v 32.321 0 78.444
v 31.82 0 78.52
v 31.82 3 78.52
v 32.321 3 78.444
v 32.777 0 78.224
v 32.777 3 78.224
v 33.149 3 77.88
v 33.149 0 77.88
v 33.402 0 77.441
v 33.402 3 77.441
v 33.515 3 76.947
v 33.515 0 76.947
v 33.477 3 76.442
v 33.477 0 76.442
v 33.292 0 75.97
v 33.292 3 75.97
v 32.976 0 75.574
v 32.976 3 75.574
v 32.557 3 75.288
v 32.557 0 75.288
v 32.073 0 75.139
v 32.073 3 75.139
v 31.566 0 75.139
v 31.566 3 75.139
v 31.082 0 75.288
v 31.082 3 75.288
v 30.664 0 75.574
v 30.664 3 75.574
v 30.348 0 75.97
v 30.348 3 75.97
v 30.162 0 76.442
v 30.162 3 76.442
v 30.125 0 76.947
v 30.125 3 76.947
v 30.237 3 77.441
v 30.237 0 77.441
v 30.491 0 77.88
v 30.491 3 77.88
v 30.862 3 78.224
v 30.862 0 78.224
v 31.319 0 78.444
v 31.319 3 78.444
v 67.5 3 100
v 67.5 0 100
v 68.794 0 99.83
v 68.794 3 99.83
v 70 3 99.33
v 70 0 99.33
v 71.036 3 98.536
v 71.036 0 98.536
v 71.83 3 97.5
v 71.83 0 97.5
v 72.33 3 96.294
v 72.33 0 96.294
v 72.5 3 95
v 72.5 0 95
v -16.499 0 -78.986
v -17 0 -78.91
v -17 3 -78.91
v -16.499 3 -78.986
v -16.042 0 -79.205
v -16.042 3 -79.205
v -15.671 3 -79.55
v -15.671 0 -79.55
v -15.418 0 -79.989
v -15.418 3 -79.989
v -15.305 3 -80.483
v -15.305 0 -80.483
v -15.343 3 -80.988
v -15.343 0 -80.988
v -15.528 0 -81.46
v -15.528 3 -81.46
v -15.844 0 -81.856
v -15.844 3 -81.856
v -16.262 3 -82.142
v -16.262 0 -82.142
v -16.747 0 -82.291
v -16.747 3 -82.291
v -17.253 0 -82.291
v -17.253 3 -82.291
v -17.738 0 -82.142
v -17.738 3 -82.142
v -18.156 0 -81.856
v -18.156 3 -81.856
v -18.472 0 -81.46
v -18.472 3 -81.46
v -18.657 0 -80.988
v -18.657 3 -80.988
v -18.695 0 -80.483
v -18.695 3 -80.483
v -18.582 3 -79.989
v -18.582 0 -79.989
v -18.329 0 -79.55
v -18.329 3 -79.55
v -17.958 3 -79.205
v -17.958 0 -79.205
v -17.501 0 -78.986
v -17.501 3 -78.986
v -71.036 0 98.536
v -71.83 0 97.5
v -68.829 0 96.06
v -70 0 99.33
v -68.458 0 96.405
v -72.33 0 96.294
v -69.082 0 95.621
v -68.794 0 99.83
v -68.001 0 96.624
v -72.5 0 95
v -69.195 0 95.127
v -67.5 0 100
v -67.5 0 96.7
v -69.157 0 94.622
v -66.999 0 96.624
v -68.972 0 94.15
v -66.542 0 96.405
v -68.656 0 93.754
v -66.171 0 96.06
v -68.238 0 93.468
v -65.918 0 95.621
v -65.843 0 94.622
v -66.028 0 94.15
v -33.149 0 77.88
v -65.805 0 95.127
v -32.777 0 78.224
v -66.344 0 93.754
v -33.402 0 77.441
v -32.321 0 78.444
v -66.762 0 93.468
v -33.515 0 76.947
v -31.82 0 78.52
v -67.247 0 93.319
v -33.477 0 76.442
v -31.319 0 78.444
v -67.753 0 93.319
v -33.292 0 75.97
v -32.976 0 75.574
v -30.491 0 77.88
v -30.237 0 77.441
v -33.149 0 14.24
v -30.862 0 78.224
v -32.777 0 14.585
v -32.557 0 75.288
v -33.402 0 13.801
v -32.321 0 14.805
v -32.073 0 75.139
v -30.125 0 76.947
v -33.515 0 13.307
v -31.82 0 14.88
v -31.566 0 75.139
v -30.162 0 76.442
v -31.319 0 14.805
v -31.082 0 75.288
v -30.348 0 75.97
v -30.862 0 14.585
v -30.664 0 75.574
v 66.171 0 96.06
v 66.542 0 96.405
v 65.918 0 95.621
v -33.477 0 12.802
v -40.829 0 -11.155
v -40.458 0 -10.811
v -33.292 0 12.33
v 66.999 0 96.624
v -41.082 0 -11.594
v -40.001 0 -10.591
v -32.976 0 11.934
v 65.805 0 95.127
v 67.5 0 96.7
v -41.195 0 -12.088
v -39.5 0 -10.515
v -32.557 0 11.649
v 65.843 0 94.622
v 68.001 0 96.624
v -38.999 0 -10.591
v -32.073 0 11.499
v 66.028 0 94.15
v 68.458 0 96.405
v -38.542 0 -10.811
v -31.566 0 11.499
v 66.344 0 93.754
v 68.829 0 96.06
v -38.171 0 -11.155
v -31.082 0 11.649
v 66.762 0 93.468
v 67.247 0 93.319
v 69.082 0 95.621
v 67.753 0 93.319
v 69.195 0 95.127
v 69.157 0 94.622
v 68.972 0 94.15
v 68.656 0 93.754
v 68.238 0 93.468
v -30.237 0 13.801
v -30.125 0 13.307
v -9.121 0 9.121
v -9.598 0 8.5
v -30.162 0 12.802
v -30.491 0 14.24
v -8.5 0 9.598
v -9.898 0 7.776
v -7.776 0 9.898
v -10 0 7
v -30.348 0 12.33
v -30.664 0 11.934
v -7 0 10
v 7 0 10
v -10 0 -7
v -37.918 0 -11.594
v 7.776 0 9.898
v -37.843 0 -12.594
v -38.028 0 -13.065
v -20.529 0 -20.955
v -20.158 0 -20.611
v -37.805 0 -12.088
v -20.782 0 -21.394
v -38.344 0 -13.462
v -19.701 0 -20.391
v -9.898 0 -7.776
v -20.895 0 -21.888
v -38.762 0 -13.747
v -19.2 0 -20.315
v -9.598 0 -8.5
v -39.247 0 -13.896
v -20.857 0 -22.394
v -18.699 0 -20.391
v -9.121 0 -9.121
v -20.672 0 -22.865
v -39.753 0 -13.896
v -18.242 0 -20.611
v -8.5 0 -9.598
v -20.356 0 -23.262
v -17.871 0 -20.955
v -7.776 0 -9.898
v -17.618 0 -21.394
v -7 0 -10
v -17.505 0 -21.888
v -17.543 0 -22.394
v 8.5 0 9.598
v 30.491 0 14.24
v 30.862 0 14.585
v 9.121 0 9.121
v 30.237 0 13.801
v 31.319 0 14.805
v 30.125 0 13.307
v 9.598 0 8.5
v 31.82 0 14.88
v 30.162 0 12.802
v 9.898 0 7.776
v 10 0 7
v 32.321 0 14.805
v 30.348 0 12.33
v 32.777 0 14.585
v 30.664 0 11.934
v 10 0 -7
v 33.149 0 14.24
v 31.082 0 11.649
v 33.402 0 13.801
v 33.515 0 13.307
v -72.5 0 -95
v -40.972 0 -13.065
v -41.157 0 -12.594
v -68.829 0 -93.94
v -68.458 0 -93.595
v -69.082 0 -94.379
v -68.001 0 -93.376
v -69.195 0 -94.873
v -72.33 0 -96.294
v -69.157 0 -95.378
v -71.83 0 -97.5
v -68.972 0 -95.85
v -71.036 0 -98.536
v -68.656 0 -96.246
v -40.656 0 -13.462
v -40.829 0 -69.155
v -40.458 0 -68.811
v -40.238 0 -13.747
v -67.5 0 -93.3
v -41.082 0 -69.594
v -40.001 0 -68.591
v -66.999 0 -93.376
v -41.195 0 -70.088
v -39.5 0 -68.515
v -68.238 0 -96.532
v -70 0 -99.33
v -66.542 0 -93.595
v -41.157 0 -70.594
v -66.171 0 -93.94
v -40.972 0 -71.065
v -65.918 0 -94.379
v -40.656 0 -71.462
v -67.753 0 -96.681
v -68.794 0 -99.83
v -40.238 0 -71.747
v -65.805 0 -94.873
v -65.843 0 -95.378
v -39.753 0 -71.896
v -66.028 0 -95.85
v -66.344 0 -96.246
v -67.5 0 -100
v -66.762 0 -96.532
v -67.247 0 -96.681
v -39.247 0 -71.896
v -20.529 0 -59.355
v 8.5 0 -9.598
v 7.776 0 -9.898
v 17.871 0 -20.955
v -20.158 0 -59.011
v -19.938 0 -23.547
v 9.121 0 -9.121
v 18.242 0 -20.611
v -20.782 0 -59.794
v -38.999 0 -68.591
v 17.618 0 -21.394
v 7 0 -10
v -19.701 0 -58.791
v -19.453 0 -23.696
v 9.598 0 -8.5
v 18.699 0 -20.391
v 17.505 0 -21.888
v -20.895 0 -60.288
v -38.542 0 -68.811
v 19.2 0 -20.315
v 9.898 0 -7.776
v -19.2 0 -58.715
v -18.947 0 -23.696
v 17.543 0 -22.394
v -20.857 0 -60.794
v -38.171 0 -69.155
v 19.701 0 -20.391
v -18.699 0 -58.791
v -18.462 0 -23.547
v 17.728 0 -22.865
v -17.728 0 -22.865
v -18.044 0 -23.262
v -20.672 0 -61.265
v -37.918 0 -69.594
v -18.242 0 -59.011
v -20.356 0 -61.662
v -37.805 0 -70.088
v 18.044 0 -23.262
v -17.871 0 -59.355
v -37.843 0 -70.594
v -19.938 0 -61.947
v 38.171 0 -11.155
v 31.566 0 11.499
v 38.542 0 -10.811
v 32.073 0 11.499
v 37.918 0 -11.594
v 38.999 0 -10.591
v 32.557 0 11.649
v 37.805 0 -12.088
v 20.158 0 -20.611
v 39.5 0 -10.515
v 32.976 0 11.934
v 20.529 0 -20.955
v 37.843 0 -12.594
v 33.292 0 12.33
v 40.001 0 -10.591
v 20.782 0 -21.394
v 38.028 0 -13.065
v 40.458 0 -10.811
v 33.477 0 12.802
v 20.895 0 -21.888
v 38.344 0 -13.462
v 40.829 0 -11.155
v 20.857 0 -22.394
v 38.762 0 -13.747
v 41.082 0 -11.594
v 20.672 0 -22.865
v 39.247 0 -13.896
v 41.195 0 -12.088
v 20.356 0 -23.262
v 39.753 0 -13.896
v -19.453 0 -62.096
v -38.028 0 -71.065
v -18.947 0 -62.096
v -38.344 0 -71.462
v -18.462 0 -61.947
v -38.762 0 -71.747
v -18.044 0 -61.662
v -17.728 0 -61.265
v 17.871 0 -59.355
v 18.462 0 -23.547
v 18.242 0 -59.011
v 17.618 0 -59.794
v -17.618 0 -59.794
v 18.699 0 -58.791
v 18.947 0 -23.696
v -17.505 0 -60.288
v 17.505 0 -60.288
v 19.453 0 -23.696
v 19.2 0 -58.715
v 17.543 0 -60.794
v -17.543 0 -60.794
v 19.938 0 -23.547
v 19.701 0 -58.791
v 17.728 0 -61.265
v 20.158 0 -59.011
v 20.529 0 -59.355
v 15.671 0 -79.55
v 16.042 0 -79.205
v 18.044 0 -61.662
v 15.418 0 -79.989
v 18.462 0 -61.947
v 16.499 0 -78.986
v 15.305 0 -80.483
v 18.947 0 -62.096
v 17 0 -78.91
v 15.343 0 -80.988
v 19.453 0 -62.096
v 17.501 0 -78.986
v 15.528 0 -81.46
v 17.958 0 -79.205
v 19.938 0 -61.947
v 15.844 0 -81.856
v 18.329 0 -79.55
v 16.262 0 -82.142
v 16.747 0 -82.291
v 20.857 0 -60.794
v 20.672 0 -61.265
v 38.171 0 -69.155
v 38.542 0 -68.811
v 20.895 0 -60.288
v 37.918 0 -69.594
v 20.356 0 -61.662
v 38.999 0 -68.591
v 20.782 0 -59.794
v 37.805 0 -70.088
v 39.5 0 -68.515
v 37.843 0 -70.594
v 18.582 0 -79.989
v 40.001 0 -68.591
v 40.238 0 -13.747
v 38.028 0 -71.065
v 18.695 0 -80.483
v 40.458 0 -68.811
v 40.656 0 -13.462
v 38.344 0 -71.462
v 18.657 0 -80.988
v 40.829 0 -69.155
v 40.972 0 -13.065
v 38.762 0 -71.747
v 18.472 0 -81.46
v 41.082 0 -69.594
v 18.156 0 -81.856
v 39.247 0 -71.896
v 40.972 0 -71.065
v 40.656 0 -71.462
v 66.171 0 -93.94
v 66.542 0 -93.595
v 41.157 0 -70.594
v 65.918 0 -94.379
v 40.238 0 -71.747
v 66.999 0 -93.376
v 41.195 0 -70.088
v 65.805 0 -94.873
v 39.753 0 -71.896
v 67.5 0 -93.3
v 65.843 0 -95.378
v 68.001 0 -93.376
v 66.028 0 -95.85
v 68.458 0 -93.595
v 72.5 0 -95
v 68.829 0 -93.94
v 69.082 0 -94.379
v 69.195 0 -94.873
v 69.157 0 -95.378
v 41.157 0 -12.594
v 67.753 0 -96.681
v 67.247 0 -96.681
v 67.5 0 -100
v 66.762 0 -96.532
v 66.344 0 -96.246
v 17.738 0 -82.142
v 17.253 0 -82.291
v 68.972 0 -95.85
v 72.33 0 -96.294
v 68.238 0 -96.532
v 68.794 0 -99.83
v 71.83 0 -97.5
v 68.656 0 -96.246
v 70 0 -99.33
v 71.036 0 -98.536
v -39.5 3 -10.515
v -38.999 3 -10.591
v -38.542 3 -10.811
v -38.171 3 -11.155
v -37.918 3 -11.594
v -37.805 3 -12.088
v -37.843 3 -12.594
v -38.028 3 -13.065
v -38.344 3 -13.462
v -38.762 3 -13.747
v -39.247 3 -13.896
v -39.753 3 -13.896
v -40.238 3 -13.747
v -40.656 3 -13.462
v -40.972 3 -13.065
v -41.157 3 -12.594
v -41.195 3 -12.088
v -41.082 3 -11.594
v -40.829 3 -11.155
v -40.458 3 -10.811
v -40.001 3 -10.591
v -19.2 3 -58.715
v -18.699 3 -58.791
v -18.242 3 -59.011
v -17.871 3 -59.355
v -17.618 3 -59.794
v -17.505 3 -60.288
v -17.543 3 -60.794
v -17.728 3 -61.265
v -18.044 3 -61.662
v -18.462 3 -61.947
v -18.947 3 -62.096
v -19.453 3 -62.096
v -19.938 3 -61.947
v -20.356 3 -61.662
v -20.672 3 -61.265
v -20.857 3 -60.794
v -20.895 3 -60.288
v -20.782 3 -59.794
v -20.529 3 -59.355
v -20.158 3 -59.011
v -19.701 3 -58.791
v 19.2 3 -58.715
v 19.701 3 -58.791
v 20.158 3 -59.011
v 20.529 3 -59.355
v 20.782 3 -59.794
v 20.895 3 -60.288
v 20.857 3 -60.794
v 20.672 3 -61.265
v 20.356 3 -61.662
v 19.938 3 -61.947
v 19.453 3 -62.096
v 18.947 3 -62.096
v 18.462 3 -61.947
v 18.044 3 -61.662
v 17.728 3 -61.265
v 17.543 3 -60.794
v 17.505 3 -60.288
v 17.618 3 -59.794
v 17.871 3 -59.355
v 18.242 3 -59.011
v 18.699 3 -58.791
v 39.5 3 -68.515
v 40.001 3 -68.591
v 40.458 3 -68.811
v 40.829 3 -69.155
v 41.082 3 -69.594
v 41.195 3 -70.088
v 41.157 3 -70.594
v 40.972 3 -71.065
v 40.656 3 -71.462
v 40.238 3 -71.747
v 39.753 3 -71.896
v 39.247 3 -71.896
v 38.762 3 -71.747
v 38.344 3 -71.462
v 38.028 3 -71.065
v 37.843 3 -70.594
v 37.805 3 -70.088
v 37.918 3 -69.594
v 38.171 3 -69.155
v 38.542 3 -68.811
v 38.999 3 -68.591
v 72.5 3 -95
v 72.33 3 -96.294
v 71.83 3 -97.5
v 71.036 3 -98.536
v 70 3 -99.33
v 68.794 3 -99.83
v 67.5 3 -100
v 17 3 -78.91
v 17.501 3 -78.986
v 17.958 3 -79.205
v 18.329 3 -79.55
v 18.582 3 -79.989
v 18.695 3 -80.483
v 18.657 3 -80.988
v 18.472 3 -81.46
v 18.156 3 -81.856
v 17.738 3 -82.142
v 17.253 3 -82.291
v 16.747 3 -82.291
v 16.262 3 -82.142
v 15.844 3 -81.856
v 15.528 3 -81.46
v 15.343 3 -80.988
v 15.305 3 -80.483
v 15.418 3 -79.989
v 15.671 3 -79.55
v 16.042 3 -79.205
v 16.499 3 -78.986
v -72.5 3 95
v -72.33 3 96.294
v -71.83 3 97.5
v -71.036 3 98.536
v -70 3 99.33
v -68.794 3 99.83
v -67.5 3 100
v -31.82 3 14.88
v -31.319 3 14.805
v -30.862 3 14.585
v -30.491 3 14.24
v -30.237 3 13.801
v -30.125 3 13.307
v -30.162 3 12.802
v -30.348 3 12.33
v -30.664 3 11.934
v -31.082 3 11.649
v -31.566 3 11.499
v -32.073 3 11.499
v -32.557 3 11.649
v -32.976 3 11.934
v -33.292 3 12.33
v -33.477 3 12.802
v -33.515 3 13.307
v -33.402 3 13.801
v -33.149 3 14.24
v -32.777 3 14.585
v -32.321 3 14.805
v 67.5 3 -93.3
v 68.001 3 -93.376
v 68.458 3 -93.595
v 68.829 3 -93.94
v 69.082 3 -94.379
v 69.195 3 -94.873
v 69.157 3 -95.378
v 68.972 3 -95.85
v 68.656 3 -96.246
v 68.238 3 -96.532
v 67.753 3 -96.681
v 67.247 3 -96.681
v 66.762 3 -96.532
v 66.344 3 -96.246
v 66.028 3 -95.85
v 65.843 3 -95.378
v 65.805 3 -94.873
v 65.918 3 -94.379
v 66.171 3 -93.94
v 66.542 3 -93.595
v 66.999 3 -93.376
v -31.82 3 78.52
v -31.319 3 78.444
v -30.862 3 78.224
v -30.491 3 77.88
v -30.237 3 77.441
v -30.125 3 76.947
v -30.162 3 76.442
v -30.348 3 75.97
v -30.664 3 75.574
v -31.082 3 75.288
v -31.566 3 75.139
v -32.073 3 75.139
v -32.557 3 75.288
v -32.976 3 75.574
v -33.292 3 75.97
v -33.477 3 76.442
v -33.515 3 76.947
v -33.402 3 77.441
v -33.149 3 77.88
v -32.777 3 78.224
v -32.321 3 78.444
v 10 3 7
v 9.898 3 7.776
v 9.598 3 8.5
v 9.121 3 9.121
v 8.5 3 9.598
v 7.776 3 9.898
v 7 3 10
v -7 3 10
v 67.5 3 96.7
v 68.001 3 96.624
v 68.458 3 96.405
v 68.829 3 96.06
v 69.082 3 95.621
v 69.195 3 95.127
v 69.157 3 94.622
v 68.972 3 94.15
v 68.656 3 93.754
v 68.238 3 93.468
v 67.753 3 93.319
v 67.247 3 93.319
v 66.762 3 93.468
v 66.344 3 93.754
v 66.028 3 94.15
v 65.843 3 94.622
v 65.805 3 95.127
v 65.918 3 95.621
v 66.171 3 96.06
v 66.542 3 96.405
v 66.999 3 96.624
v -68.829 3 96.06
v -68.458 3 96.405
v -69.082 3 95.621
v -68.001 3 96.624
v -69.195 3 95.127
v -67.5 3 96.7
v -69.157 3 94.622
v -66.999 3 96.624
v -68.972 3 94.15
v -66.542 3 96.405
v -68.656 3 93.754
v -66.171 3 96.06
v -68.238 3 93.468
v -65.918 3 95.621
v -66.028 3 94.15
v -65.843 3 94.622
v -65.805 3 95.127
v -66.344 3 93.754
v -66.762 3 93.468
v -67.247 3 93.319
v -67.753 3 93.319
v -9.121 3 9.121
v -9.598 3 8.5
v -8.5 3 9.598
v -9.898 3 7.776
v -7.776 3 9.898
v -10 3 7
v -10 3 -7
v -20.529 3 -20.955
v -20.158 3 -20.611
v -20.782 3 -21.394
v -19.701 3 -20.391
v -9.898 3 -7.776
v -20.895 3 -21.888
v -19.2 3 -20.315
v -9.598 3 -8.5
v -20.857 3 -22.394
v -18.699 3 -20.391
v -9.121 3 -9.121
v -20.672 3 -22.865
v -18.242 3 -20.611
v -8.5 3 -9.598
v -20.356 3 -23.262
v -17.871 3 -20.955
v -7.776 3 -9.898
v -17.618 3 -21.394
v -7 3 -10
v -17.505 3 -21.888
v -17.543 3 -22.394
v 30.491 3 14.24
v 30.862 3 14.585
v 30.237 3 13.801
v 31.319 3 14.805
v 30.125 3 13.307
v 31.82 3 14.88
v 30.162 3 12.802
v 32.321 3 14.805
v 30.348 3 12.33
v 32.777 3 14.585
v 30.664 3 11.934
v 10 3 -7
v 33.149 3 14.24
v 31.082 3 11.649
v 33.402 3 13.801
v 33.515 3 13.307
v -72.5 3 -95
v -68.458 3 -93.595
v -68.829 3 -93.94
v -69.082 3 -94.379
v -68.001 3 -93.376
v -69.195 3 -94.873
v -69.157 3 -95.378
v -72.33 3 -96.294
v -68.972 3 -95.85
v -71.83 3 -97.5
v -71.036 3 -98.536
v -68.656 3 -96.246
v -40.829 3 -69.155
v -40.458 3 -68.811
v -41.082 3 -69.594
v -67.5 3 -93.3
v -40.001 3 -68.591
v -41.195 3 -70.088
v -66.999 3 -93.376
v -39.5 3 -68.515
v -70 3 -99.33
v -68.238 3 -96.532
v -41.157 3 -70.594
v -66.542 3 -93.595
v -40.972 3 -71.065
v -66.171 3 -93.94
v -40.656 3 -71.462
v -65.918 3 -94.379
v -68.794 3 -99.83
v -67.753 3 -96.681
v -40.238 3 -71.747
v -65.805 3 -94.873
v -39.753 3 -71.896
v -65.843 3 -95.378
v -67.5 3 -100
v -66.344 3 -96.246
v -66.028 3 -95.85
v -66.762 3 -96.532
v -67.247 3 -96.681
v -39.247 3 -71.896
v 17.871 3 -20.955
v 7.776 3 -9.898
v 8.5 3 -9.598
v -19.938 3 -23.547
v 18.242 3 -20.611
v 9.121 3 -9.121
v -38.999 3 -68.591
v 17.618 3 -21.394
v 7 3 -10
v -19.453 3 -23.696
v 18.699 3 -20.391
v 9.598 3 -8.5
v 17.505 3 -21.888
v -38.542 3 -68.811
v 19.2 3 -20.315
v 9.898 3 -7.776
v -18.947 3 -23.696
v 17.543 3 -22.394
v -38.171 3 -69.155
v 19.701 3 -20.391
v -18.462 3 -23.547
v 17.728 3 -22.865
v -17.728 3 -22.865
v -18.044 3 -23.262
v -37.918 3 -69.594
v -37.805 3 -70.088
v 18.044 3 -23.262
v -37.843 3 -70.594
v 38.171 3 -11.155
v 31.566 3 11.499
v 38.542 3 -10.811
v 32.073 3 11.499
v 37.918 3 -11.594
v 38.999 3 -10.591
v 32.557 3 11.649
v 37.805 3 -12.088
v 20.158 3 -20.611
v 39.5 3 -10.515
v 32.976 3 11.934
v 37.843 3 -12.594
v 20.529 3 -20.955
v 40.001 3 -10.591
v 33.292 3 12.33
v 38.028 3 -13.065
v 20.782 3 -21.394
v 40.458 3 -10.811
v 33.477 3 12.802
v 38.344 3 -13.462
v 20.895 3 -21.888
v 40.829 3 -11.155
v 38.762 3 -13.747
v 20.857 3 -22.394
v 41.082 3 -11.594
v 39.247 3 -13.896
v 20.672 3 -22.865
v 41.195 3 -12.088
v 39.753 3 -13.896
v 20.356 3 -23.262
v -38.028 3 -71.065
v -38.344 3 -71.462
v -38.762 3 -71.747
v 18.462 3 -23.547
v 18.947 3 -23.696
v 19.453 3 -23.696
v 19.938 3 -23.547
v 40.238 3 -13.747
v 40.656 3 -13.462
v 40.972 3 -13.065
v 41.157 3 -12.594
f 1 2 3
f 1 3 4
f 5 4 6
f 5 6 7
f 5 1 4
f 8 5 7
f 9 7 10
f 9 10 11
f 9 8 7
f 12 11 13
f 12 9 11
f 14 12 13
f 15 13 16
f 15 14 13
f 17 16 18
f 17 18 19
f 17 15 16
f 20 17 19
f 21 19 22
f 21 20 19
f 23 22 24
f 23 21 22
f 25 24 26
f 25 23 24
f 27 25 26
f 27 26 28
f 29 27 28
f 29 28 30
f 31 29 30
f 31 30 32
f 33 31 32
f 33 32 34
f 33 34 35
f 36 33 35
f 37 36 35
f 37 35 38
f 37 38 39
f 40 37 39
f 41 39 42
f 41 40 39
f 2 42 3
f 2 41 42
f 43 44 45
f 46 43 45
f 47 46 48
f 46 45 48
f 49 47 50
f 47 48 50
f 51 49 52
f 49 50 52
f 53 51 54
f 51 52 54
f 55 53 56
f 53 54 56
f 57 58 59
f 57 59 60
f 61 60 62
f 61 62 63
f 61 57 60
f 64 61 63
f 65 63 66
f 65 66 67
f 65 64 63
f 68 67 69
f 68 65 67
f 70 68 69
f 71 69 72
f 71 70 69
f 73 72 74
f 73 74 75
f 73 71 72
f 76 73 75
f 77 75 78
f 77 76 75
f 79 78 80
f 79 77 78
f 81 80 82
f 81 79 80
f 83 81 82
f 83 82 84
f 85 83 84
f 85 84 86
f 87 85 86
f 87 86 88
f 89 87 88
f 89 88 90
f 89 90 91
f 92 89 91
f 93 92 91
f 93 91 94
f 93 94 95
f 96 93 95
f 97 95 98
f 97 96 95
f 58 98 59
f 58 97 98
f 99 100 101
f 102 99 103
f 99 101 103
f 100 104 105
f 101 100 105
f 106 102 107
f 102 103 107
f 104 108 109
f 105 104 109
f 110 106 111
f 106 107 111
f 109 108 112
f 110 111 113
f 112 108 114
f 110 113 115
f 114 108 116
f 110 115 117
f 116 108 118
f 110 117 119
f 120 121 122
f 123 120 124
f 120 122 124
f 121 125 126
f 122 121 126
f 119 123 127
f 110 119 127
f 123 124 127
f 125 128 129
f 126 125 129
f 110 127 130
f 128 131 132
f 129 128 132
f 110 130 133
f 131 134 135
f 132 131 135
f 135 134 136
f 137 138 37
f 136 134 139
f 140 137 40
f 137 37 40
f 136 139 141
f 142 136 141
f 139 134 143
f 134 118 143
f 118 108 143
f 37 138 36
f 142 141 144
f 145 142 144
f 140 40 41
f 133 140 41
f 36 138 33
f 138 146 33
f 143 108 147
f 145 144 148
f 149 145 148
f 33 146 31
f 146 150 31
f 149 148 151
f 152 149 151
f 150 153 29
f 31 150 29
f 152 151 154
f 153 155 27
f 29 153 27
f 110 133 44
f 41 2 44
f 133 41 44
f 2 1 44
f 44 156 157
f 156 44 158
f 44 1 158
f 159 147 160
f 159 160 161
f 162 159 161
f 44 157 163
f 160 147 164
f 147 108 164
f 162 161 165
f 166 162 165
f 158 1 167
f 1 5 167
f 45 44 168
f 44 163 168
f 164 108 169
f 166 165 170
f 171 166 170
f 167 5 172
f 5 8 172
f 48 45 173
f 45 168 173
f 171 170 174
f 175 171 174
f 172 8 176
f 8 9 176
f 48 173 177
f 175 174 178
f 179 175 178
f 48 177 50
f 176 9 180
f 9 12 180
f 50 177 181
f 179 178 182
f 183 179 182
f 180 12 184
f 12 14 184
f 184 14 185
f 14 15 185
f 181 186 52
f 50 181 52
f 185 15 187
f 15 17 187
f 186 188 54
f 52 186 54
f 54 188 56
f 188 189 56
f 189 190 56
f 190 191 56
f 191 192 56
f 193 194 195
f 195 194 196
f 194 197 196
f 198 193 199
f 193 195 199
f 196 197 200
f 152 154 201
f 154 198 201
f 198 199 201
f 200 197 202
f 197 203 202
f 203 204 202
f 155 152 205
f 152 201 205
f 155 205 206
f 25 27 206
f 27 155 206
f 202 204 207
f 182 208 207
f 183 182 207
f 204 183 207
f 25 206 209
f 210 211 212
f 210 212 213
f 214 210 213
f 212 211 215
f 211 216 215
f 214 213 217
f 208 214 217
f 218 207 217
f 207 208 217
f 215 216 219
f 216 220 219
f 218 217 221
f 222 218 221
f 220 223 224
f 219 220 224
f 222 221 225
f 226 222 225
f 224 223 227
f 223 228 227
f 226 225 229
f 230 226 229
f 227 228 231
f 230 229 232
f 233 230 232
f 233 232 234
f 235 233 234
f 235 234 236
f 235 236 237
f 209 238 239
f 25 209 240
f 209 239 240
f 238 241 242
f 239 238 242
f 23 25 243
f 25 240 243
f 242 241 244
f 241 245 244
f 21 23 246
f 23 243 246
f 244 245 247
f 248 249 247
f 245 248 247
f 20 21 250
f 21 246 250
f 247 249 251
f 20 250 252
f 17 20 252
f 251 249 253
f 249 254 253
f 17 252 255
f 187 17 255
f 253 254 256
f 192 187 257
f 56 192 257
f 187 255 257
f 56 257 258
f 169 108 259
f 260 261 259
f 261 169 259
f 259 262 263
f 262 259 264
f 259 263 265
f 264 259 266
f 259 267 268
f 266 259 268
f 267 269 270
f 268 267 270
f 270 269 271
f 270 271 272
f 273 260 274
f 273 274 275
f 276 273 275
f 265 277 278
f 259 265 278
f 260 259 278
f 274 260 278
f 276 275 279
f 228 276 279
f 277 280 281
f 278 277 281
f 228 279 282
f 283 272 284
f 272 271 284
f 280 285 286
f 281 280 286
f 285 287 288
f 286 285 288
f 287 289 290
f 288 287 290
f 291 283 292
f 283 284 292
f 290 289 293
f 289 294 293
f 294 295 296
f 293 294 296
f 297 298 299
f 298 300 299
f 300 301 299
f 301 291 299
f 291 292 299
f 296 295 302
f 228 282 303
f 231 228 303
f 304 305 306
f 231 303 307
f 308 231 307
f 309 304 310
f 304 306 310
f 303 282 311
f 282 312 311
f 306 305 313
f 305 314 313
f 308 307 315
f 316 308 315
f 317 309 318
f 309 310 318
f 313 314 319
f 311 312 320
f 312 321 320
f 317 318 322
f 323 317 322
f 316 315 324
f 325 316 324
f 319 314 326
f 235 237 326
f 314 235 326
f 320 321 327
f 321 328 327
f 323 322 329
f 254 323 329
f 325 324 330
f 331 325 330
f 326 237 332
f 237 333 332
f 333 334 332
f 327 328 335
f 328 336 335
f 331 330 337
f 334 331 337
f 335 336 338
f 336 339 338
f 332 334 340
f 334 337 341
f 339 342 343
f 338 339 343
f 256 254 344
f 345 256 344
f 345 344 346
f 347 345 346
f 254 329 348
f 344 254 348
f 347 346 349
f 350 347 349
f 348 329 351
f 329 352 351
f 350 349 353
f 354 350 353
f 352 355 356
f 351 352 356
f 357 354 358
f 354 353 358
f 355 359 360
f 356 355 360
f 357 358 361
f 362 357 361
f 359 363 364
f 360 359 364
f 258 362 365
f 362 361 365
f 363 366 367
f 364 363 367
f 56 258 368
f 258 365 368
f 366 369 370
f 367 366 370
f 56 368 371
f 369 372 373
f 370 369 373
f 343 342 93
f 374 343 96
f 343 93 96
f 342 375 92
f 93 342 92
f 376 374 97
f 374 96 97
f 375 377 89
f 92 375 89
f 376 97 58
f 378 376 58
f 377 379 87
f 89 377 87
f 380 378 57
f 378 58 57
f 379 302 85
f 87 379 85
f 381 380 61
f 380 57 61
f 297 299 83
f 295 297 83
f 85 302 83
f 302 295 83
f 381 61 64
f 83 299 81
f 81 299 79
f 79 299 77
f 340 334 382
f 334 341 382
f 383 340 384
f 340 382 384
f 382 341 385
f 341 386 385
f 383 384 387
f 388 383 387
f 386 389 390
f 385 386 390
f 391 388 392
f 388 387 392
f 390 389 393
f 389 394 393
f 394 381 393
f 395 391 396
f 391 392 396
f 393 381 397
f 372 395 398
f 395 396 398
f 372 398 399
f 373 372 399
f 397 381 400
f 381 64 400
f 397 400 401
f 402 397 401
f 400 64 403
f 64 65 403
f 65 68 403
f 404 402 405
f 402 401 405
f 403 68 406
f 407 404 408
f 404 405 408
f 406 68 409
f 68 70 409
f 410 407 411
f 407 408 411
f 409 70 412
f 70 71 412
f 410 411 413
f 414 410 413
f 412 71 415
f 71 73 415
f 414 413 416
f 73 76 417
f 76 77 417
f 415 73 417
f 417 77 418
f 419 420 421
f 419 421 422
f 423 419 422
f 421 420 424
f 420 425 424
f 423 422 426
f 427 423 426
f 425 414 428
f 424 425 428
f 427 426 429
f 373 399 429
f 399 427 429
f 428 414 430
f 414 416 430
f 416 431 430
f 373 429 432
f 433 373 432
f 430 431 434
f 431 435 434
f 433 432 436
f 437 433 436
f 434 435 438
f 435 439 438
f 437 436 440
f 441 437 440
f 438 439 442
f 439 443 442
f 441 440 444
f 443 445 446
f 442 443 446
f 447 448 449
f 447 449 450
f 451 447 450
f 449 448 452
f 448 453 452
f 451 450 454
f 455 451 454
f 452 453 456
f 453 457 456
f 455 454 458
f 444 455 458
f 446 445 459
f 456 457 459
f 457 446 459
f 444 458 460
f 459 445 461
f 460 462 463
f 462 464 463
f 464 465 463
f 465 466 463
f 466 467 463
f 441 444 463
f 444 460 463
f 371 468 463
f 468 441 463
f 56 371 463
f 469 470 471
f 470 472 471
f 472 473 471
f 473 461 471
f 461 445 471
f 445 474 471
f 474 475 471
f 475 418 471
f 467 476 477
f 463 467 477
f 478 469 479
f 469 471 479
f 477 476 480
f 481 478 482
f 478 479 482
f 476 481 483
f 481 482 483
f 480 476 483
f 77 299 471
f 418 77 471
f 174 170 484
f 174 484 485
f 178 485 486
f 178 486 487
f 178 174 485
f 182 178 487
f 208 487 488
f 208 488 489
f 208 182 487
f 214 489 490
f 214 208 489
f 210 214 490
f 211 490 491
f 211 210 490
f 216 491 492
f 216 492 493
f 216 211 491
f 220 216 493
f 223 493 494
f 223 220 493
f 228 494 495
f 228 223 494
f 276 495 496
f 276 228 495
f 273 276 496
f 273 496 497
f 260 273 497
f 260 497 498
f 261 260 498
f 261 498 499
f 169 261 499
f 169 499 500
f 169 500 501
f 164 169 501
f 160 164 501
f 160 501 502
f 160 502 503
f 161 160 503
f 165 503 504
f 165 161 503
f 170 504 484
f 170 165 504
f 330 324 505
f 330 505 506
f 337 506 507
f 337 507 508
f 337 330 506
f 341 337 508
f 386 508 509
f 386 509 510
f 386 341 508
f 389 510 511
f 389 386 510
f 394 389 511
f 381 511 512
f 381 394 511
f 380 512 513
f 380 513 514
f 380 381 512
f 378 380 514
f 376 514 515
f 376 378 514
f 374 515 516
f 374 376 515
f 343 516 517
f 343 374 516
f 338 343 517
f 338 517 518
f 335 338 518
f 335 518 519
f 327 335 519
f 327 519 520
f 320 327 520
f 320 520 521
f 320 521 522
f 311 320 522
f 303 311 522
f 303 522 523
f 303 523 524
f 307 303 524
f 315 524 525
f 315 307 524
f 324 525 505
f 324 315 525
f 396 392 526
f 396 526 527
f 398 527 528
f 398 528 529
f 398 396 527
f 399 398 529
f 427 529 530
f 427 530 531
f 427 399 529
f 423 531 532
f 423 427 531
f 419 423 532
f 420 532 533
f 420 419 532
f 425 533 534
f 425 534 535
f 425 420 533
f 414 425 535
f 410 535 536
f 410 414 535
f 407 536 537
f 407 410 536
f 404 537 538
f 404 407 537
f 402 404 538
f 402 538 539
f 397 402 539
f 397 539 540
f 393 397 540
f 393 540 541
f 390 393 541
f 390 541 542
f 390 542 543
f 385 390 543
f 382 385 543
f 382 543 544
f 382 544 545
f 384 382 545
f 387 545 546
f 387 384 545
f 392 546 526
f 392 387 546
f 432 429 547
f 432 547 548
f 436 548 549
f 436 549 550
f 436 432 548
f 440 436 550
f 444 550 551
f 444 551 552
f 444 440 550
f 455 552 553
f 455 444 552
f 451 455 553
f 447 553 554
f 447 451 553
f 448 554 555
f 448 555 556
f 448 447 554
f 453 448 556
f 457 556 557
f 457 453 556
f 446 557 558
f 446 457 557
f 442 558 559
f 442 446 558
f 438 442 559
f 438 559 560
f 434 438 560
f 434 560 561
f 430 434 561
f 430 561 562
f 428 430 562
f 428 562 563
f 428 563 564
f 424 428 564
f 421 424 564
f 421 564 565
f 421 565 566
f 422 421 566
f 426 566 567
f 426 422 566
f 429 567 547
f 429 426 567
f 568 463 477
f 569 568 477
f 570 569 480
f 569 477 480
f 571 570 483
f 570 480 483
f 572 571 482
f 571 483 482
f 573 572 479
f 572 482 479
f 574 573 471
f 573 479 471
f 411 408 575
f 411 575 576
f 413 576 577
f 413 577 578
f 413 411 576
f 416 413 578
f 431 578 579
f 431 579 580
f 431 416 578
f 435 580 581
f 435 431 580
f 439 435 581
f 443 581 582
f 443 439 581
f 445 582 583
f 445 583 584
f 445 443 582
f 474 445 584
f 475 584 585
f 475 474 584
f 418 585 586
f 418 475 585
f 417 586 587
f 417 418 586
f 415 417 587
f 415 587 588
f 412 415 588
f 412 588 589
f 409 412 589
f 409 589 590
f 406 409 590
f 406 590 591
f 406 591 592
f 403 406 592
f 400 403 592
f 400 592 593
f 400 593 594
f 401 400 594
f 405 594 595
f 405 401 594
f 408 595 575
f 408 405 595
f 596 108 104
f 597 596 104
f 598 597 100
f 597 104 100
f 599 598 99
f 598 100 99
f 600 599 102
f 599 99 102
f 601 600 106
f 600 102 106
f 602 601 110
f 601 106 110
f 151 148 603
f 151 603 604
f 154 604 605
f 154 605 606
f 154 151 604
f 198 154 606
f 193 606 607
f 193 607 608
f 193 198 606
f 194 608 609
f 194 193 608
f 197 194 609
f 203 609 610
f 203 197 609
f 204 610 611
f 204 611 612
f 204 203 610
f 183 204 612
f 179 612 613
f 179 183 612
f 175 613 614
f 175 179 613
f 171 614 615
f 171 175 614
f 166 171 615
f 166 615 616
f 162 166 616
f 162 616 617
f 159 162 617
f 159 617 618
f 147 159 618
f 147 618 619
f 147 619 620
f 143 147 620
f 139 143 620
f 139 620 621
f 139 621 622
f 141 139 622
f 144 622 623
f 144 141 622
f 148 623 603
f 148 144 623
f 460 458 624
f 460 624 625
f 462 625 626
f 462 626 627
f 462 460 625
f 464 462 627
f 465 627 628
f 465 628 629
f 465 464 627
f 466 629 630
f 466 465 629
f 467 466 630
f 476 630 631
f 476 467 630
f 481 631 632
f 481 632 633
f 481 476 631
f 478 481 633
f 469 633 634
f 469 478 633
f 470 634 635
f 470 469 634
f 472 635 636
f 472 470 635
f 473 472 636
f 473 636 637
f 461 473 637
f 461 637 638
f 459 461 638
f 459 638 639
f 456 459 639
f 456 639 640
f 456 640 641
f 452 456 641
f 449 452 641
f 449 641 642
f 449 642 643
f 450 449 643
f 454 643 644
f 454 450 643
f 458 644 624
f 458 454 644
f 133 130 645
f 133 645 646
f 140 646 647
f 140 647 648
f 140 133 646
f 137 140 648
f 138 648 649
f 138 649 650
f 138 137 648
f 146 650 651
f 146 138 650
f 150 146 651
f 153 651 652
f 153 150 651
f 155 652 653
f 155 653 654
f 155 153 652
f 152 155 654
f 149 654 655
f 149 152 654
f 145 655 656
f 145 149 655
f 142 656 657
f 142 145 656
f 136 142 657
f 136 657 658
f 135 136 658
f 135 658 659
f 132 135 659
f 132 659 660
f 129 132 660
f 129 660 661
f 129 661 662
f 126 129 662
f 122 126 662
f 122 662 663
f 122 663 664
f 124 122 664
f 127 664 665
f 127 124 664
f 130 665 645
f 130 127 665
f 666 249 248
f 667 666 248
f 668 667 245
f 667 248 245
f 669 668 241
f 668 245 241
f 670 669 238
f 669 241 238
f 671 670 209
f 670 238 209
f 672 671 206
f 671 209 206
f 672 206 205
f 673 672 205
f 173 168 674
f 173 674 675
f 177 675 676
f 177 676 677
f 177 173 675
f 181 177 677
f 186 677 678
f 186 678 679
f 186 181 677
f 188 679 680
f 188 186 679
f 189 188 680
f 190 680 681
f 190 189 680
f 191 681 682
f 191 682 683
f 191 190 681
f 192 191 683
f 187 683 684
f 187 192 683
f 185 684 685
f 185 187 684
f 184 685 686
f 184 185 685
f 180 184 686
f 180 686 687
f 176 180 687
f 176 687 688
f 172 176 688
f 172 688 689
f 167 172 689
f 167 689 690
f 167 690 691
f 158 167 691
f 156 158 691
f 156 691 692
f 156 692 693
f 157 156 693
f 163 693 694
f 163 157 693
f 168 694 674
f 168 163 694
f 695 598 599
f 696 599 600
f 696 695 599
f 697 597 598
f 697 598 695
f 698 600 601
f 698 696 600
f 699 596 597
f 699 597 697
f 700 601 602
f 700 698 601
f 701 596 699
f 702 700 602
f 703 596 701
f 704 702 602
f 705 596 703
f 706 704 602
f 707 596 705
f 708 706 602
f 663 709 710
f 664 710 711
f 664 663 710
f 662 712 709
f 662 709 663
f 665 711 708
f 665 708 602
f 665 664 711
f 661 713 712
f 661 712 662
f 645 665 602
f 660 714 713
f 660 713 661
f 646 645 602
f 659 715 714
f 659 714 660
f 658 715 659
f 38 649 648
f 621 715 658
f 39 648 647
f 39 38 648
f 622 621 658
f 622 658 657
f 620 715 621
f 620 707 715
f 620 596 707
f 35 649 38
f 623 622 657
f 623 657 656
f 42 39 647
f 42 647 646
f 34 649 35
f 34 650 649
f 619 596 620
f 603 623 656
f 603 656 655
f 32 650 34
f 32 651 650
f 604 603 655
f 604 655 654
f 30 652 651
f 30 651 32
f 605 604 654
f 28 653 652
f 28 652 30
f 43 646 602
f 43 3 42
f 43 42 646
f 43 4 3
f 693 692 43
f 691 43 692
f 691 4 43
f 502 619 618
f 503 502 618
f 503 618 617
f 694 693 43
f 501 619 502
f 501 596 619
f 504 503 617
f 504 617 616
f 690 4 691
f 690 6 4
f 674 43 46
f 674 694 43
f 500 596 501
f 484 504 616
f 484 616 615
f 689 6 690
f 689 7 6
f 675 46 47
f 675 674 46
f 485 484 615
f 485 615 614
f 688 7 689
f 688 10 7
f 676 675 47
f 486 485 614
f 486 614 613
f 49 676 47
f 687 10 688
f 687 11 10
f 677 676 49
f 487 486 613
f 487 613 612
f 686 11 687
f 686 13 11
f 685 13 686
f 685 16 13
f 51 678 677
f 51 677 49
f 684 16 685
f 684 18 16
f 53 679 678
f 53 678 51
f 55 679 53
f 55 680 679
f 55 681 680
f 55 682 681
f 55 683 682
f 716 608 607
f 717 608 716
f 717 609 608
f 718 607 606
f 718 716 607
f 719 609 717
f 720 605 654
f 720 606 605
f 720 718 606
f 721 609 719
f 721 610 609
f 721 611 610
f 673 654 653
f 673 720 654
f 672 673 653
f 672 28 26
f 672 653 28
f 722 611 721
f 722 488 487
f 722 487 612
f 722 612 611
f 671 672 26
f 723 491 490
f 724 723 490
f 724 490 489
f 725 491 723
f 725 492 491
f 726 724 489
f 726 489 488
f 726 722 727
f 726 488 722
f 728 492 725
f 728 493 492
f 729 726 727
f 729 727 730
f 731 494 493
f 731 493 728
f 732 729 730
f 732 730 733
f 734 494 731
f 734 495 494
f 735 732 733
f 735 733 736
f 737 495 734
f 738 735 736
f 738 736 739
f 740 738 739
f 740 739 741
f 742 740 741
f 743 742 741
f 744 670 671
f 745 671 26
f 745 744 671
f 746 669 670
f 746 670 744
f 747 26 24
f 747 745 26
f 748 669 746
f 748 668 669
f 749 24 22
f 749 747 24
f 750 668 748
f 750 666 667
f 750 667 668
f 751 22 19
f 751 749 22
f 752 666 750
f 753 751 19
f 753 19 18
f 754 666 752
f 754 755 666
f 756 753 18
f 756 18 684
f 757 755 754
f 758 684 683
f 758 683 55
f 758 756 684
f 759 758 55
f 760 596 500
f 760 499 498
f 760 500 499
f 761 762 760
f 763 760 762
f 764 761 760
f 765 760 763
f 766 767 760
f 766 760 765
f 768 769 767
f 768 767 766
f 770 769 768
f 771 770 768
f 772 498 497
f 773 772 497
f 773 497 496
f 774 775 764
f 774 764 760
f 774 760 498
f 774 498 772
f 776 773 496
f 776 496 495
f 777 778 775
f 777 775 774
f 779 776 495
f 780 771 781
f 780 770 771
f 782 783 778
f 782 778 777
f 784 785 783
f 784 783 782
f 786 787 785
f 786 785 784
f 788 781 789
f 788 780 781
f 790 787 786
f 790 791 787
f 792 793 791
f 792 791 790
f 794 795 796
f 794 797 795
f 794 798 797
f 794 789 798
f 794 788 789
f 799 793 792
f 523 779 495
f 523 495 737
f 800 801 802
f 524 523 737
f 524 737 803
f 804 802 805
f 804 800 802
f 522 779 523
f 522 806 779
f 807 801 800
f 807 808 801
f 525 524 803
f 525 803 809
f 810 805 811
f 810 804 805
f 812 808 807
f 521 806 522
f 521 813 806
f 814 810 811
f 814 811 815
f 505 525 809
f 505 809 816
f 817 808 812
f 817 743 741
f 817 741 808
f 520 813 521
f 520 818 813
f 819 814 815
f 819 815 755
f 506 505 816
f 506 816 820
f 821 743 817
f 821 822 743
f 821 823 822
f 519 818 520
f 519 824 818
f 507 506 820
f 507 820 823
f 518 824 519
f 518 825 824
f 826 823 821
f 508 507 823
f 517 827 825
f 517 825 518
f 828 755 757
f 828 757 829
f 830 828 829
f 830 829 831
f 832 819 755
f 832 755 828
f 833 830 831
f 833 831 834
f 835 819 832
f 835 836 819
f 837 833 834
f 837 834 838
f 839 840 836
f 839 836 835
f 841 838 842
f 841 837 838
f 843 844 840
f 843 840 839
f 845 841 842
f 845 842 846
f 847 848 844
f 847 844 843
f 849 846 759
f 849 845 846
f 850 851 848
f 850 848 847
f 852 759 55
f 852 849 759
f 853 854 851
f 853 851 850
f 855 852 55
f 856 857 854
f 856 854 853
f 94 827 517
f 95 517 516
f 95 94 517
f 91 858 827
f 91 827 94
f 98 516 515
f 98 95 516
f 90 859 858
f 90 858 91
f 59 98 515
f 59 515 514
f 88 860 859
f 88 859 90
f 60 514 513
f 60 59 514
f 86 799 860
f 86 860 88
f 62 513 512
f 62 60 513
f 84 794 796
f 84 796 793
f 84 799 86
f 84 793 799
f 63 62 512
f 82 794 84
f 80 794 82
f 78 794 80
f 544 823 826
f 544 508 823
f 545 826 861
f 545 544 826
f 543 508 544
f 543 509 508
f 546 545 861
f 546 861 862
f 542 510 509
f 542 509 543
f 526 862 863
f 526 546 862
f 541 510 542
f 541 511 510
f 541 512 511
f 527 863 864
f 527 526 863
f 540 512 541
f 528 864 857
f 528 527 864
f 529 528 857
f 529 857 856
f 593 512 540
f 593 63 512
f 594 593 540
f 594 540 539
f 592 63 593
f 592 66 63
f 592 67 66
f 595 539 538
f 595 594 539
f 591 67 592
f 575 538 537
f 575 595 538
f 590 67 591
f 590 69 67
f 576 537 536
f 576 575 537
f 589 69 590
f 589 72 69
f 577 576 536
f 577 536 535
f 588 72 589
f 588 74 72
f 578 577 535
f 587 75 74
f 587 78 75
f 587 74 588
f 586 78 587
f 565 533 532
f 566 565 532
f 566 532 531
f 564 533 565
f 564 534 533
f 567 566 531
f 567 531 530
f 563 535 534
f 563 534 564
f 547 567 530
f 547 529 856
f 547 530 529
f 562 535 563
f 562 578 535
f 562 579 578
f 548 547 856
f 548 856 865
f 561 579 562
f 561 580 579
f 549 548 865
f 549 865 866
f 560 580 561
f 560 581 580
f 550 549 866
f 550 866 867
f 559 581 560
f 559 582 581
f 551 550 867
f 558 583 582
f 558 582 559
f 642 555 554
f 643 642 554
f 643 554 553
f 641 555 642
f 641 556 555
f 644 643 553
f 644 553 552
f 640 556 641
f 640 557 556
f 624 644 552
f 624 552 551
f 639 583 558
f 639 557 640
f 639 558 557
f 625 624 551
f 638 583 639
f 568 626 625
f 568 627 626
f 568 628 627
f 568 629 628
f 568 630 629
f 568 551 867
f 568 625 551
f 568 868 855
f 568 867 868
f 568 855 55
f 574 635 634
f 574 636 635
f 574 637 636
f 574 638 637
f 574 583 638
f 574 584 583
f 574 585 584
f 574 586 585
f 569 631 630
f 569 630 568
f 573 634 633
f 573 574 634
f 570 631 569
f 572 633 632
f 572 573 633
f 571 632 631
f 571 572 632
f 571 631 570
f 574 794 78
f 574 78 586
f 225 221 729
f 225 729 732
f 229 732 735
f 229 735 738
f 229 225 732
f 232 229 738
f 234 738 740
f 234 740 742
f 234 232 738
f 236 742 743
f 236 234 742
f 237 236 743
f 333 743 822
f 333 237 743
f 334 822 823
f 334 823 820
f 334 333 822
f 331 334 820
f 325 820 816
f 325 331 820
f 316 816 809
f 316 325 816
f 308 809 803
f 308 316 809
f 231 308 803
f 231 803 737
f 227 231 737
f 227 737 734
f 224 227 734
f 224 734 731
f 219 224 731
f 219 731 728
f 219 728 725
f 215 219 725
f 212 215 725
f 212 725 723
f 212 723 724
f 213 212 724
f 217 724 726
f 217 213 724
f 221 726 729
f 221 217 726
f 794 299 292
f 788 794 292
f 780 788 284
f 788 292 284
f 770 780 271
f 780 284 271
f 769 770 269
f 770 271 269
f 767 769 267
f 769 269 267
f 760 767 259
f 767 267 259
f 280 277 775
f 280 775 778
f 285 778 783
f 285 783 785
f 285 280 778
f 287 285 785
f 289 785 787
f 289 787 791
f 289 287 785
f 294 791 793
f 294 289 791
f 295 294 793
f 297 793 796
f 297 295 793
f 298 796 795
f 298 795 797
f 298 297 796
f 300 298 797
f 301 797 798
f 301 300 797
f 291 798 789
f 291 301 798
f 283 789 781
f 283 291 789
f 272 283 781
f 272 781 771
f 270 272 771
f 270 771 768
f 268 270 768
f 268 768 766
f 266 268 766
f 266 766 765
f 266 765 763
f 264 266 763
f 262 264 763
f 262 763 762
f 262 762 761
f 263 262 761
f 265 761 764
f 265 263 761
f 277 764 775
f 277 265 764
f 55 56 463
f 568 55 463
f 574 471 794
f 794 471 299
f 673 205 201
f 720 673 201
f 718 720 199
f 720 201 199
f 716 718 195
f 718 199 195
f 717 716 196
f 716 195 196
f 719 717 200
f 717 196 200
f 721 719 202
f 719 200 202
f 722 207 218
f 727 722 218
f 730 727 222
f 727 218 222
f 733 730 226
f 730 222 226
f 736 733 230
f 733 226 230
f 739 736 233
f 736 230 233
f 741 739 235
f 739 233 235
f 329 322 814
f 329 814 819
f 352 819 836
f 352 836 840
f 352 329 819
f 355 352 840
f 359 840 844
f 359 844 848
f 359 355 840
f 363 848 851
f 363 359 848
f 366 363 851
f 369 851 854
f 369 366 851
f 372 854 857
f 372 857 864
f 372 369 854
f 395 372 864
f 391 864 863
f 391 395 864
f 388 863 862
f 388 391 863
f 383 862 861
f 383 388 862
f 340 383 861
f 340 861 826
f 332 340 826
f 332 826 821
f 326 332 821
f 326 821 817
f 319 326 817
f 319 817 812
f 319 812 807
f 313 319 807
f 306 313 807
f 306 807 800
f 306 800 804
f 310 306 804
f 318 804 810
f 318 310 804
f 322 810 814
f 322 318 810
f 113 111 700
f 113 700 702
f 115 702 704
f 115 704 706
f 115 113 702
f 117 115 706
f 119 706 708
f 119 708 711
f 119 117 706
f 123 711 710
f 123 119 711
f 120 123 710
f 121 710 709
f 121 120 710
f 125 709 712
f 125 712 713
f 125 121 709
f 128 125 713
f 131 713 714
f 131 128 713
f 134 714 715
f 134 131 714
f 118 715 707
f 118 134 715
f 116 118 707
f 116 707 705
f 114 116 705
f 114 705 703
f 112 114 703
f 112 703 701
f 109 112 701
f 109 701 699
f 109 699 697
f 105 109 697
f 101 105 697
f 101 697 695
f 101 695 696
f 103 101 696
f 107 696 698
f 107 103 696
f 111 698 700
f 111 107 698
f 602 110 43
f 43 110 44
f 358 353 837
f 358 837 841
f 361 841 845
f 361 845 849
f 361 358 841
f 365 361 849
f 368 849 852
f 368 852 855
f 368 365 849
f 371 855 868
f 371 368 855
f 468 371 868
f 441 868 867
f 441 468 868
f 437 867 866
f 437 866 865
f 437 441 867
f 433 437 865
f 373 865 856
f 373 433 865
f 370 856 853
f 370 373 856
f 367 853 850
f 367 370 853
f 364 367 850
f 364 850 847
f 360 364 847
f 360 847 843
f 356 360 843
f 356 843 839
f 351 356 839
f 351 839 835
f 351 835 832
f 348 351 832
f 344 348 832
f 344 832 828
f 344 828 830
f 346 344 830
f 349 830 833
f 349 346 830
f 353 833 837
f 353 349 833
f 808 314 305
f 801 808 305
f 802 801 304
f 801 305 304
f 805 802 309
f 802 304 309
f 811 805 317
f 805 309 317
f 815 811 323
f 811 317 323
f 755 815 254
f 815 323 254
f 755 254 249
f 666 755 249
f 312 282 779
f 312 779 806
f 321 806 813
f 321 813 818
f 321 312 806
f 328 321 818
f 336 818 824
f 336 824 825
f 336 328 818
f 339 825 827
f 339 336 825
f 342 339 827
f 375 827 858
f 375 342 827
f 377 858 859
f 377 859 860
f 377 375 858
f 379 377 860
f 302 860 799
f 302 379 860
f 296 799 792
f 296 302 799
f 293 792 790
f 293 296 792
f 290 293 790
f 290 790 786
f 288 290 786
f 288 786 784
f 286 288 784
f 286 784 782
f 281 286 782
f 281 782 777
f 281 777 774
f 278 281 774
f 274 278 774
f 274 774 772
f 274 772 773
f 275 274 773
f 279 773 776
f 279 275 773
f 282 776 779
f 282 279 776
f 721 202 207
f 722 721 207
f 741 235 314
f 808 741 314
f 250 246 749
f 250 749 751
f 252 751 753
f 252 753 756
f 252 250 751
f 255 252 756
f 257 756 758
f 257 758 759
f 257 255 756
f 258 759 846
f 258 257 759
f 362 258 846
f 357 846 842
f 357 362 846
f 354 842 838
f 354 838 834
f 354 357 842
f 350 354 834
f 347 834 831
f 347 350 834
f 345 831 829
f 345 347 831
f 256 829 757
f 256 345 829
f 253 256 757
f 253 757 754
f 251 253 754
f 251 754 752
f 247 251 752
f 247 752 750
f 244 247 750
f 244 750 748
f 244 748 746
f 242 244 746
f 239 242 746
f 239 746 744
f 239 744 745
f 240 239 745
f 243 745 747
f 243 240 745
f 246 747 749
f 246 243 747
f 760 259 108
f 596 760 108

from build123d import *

# Parameters (mm, degrees)
SKETCH_1_R      = 1.7
EXTRUDE_1_DEPTH = 3


with BuildPart() as part:
    # 草图1 → 凸台-拉伸1 (new body)
    with BuildSketch(Plane(origin=(0, 0, 0), x_dir=(1, 0, 0), z_dir=(0, 1, 0))):
        with BuildLine():
            Line((-67.5, -100), (67.5, -100))
            ThreePointArc((67.5, -100), (71.035533906, -98.535533906), (72.5, -95))
            Line((72.5, -95), (72.5, 95))
            ThreePointArc((72.5, 95), (71.035533906, 98.535533906), (67.5, 100))
            Line((67.5, 100), (-67.5, 100))
            ThreePointArc((-67.5, 100), (-71.035533906, 98.535533906), (-72.5, 95))
            Line((-72.5, 95), (-72.5, -95))
            ThreePointArc((-72.5, -95), (-71.035533906, -98.535533906), (-67.5, -100))
        make_face()
        with Locations(Location((-67.5, 95, 0), (0, 0, 270))):
            Circle(SKETCH_1_R, mode=Mode.SUBTRACT)
        with Locations(Location((67.5, 95, 0), (0, 0, 270))):
            Circle(SKETCH_1_R, mode=Mode.SUBTRACT)
        with Locations(Location((67.5, -95, 0), (0, 0, 270))):
            Circle(SKETCH_1_R, mode=Mode.SUBTRACT)
        with Locations(Location((-67.5, -95, 0), (0, 0, 270))):
            Circle(SKETCH_1_R, mode=Mode.SUBTRACT)
        with Locations(Location((-39.5, 70.215403043, 0), (0, 0, 270))):
            Circle(SKETCH_1_R, mode=Mode.SUBTRACT)
        with Locations(Location((-39.5, 12.215403043, 0), (0, 0, 270))):
            Circle(SKETCH_1_R, mode=Mode.SUBTRACT)
        with Locations(Location((39.5, 12.215403043, 0), (0, 0, 270))):
            Circle(SKETCH_1_R, mode=Mode.SUBTRACT)
        with Locations(Location((39.5, 70.215403043, 0), (0, 0, 270))):
            Circle(SKETCH_1_R, mode=Mode.SUBTRACT)
        with Locations(Location((-17, 80.610004264, 0), (0, 0, 270))):
            Circle(SKETCH_1_R, mode=Mode.SUBTRACT)
        with Locations(Location((17, 80.610004264, 0), (0, 0, 270))):
            Circle(SKETCH_1_R, mode=Mode.SUBTRACT)
        with Locations(Location((-31.819805153, -13.180194847, 0), (0, 0, 270))):
            Circle(SKETCH_1_R, mode=Mode.SUBTRACT)
        with Locations(Location((31.819805153, -13.180194847, 0), (0, 0, 270))):
            Circle(SKETCH_1_R, mode=Mode.SUBTRACT)
        with Locations(Location((31.819805153, -76.819805153, 0), (0, 0, 270))):
            Circle(SKETCH_1_R, mode=Mode.SUBTRACT)
        with Locations(Location((-31.819805153, -76.819805153, 0), (0, 0, 270))):
            Circle(SKETCH_1_R, mode=Mode.SUBTRACT)
        with Locations(Location((-19.2, 60.415403043, 0), (0, 0, 270))):
            Circle(SKETCH_1_R, mode=Mode.SUBTRACT)
        with Locations(Location((19.2, 60.415403043, 0), (0, 0, 270))):
            Circle(SKETCH_1_R, mode=Mode.SUBTRACT)
        with Locations(Location((19.2, 22.015403043, 0), (0, 0, 270))):
            Circle(SKETCH_1_R, mode=Mode.SUBTRACT)
        with Locations(Location((-19.2, 22.015403043, 0), (0, 0, 270))):
            Circle(SKETCH_1_R, mode=Mode.SUBTRACT)
        with BuildLine():
            Line((-7, 10), (7, 10))
            ThreePointArc((7, 10), (9.121320344, 9.121320344), (10, 7))
            Line((10, 7), (10, -7))
            ThreePointArc((10, -7), (9.121320344, -9.121320344), (7, -10))
            Line((7, -10), (-7, -10))
            ThreePointArc((-7, -10), (-9.121320344, -9.121320344), (-10, -7))
            Line((-10, -7), (-10, 7))
            ThreePointArc((-10, 7), (-9.121320344, 9.121320344), (-7, 10))
        make_face(mode=Mode.SUBTRACT)
    extrude(amount=EXTRUDE_1_DEPTH)


solid = part.part
